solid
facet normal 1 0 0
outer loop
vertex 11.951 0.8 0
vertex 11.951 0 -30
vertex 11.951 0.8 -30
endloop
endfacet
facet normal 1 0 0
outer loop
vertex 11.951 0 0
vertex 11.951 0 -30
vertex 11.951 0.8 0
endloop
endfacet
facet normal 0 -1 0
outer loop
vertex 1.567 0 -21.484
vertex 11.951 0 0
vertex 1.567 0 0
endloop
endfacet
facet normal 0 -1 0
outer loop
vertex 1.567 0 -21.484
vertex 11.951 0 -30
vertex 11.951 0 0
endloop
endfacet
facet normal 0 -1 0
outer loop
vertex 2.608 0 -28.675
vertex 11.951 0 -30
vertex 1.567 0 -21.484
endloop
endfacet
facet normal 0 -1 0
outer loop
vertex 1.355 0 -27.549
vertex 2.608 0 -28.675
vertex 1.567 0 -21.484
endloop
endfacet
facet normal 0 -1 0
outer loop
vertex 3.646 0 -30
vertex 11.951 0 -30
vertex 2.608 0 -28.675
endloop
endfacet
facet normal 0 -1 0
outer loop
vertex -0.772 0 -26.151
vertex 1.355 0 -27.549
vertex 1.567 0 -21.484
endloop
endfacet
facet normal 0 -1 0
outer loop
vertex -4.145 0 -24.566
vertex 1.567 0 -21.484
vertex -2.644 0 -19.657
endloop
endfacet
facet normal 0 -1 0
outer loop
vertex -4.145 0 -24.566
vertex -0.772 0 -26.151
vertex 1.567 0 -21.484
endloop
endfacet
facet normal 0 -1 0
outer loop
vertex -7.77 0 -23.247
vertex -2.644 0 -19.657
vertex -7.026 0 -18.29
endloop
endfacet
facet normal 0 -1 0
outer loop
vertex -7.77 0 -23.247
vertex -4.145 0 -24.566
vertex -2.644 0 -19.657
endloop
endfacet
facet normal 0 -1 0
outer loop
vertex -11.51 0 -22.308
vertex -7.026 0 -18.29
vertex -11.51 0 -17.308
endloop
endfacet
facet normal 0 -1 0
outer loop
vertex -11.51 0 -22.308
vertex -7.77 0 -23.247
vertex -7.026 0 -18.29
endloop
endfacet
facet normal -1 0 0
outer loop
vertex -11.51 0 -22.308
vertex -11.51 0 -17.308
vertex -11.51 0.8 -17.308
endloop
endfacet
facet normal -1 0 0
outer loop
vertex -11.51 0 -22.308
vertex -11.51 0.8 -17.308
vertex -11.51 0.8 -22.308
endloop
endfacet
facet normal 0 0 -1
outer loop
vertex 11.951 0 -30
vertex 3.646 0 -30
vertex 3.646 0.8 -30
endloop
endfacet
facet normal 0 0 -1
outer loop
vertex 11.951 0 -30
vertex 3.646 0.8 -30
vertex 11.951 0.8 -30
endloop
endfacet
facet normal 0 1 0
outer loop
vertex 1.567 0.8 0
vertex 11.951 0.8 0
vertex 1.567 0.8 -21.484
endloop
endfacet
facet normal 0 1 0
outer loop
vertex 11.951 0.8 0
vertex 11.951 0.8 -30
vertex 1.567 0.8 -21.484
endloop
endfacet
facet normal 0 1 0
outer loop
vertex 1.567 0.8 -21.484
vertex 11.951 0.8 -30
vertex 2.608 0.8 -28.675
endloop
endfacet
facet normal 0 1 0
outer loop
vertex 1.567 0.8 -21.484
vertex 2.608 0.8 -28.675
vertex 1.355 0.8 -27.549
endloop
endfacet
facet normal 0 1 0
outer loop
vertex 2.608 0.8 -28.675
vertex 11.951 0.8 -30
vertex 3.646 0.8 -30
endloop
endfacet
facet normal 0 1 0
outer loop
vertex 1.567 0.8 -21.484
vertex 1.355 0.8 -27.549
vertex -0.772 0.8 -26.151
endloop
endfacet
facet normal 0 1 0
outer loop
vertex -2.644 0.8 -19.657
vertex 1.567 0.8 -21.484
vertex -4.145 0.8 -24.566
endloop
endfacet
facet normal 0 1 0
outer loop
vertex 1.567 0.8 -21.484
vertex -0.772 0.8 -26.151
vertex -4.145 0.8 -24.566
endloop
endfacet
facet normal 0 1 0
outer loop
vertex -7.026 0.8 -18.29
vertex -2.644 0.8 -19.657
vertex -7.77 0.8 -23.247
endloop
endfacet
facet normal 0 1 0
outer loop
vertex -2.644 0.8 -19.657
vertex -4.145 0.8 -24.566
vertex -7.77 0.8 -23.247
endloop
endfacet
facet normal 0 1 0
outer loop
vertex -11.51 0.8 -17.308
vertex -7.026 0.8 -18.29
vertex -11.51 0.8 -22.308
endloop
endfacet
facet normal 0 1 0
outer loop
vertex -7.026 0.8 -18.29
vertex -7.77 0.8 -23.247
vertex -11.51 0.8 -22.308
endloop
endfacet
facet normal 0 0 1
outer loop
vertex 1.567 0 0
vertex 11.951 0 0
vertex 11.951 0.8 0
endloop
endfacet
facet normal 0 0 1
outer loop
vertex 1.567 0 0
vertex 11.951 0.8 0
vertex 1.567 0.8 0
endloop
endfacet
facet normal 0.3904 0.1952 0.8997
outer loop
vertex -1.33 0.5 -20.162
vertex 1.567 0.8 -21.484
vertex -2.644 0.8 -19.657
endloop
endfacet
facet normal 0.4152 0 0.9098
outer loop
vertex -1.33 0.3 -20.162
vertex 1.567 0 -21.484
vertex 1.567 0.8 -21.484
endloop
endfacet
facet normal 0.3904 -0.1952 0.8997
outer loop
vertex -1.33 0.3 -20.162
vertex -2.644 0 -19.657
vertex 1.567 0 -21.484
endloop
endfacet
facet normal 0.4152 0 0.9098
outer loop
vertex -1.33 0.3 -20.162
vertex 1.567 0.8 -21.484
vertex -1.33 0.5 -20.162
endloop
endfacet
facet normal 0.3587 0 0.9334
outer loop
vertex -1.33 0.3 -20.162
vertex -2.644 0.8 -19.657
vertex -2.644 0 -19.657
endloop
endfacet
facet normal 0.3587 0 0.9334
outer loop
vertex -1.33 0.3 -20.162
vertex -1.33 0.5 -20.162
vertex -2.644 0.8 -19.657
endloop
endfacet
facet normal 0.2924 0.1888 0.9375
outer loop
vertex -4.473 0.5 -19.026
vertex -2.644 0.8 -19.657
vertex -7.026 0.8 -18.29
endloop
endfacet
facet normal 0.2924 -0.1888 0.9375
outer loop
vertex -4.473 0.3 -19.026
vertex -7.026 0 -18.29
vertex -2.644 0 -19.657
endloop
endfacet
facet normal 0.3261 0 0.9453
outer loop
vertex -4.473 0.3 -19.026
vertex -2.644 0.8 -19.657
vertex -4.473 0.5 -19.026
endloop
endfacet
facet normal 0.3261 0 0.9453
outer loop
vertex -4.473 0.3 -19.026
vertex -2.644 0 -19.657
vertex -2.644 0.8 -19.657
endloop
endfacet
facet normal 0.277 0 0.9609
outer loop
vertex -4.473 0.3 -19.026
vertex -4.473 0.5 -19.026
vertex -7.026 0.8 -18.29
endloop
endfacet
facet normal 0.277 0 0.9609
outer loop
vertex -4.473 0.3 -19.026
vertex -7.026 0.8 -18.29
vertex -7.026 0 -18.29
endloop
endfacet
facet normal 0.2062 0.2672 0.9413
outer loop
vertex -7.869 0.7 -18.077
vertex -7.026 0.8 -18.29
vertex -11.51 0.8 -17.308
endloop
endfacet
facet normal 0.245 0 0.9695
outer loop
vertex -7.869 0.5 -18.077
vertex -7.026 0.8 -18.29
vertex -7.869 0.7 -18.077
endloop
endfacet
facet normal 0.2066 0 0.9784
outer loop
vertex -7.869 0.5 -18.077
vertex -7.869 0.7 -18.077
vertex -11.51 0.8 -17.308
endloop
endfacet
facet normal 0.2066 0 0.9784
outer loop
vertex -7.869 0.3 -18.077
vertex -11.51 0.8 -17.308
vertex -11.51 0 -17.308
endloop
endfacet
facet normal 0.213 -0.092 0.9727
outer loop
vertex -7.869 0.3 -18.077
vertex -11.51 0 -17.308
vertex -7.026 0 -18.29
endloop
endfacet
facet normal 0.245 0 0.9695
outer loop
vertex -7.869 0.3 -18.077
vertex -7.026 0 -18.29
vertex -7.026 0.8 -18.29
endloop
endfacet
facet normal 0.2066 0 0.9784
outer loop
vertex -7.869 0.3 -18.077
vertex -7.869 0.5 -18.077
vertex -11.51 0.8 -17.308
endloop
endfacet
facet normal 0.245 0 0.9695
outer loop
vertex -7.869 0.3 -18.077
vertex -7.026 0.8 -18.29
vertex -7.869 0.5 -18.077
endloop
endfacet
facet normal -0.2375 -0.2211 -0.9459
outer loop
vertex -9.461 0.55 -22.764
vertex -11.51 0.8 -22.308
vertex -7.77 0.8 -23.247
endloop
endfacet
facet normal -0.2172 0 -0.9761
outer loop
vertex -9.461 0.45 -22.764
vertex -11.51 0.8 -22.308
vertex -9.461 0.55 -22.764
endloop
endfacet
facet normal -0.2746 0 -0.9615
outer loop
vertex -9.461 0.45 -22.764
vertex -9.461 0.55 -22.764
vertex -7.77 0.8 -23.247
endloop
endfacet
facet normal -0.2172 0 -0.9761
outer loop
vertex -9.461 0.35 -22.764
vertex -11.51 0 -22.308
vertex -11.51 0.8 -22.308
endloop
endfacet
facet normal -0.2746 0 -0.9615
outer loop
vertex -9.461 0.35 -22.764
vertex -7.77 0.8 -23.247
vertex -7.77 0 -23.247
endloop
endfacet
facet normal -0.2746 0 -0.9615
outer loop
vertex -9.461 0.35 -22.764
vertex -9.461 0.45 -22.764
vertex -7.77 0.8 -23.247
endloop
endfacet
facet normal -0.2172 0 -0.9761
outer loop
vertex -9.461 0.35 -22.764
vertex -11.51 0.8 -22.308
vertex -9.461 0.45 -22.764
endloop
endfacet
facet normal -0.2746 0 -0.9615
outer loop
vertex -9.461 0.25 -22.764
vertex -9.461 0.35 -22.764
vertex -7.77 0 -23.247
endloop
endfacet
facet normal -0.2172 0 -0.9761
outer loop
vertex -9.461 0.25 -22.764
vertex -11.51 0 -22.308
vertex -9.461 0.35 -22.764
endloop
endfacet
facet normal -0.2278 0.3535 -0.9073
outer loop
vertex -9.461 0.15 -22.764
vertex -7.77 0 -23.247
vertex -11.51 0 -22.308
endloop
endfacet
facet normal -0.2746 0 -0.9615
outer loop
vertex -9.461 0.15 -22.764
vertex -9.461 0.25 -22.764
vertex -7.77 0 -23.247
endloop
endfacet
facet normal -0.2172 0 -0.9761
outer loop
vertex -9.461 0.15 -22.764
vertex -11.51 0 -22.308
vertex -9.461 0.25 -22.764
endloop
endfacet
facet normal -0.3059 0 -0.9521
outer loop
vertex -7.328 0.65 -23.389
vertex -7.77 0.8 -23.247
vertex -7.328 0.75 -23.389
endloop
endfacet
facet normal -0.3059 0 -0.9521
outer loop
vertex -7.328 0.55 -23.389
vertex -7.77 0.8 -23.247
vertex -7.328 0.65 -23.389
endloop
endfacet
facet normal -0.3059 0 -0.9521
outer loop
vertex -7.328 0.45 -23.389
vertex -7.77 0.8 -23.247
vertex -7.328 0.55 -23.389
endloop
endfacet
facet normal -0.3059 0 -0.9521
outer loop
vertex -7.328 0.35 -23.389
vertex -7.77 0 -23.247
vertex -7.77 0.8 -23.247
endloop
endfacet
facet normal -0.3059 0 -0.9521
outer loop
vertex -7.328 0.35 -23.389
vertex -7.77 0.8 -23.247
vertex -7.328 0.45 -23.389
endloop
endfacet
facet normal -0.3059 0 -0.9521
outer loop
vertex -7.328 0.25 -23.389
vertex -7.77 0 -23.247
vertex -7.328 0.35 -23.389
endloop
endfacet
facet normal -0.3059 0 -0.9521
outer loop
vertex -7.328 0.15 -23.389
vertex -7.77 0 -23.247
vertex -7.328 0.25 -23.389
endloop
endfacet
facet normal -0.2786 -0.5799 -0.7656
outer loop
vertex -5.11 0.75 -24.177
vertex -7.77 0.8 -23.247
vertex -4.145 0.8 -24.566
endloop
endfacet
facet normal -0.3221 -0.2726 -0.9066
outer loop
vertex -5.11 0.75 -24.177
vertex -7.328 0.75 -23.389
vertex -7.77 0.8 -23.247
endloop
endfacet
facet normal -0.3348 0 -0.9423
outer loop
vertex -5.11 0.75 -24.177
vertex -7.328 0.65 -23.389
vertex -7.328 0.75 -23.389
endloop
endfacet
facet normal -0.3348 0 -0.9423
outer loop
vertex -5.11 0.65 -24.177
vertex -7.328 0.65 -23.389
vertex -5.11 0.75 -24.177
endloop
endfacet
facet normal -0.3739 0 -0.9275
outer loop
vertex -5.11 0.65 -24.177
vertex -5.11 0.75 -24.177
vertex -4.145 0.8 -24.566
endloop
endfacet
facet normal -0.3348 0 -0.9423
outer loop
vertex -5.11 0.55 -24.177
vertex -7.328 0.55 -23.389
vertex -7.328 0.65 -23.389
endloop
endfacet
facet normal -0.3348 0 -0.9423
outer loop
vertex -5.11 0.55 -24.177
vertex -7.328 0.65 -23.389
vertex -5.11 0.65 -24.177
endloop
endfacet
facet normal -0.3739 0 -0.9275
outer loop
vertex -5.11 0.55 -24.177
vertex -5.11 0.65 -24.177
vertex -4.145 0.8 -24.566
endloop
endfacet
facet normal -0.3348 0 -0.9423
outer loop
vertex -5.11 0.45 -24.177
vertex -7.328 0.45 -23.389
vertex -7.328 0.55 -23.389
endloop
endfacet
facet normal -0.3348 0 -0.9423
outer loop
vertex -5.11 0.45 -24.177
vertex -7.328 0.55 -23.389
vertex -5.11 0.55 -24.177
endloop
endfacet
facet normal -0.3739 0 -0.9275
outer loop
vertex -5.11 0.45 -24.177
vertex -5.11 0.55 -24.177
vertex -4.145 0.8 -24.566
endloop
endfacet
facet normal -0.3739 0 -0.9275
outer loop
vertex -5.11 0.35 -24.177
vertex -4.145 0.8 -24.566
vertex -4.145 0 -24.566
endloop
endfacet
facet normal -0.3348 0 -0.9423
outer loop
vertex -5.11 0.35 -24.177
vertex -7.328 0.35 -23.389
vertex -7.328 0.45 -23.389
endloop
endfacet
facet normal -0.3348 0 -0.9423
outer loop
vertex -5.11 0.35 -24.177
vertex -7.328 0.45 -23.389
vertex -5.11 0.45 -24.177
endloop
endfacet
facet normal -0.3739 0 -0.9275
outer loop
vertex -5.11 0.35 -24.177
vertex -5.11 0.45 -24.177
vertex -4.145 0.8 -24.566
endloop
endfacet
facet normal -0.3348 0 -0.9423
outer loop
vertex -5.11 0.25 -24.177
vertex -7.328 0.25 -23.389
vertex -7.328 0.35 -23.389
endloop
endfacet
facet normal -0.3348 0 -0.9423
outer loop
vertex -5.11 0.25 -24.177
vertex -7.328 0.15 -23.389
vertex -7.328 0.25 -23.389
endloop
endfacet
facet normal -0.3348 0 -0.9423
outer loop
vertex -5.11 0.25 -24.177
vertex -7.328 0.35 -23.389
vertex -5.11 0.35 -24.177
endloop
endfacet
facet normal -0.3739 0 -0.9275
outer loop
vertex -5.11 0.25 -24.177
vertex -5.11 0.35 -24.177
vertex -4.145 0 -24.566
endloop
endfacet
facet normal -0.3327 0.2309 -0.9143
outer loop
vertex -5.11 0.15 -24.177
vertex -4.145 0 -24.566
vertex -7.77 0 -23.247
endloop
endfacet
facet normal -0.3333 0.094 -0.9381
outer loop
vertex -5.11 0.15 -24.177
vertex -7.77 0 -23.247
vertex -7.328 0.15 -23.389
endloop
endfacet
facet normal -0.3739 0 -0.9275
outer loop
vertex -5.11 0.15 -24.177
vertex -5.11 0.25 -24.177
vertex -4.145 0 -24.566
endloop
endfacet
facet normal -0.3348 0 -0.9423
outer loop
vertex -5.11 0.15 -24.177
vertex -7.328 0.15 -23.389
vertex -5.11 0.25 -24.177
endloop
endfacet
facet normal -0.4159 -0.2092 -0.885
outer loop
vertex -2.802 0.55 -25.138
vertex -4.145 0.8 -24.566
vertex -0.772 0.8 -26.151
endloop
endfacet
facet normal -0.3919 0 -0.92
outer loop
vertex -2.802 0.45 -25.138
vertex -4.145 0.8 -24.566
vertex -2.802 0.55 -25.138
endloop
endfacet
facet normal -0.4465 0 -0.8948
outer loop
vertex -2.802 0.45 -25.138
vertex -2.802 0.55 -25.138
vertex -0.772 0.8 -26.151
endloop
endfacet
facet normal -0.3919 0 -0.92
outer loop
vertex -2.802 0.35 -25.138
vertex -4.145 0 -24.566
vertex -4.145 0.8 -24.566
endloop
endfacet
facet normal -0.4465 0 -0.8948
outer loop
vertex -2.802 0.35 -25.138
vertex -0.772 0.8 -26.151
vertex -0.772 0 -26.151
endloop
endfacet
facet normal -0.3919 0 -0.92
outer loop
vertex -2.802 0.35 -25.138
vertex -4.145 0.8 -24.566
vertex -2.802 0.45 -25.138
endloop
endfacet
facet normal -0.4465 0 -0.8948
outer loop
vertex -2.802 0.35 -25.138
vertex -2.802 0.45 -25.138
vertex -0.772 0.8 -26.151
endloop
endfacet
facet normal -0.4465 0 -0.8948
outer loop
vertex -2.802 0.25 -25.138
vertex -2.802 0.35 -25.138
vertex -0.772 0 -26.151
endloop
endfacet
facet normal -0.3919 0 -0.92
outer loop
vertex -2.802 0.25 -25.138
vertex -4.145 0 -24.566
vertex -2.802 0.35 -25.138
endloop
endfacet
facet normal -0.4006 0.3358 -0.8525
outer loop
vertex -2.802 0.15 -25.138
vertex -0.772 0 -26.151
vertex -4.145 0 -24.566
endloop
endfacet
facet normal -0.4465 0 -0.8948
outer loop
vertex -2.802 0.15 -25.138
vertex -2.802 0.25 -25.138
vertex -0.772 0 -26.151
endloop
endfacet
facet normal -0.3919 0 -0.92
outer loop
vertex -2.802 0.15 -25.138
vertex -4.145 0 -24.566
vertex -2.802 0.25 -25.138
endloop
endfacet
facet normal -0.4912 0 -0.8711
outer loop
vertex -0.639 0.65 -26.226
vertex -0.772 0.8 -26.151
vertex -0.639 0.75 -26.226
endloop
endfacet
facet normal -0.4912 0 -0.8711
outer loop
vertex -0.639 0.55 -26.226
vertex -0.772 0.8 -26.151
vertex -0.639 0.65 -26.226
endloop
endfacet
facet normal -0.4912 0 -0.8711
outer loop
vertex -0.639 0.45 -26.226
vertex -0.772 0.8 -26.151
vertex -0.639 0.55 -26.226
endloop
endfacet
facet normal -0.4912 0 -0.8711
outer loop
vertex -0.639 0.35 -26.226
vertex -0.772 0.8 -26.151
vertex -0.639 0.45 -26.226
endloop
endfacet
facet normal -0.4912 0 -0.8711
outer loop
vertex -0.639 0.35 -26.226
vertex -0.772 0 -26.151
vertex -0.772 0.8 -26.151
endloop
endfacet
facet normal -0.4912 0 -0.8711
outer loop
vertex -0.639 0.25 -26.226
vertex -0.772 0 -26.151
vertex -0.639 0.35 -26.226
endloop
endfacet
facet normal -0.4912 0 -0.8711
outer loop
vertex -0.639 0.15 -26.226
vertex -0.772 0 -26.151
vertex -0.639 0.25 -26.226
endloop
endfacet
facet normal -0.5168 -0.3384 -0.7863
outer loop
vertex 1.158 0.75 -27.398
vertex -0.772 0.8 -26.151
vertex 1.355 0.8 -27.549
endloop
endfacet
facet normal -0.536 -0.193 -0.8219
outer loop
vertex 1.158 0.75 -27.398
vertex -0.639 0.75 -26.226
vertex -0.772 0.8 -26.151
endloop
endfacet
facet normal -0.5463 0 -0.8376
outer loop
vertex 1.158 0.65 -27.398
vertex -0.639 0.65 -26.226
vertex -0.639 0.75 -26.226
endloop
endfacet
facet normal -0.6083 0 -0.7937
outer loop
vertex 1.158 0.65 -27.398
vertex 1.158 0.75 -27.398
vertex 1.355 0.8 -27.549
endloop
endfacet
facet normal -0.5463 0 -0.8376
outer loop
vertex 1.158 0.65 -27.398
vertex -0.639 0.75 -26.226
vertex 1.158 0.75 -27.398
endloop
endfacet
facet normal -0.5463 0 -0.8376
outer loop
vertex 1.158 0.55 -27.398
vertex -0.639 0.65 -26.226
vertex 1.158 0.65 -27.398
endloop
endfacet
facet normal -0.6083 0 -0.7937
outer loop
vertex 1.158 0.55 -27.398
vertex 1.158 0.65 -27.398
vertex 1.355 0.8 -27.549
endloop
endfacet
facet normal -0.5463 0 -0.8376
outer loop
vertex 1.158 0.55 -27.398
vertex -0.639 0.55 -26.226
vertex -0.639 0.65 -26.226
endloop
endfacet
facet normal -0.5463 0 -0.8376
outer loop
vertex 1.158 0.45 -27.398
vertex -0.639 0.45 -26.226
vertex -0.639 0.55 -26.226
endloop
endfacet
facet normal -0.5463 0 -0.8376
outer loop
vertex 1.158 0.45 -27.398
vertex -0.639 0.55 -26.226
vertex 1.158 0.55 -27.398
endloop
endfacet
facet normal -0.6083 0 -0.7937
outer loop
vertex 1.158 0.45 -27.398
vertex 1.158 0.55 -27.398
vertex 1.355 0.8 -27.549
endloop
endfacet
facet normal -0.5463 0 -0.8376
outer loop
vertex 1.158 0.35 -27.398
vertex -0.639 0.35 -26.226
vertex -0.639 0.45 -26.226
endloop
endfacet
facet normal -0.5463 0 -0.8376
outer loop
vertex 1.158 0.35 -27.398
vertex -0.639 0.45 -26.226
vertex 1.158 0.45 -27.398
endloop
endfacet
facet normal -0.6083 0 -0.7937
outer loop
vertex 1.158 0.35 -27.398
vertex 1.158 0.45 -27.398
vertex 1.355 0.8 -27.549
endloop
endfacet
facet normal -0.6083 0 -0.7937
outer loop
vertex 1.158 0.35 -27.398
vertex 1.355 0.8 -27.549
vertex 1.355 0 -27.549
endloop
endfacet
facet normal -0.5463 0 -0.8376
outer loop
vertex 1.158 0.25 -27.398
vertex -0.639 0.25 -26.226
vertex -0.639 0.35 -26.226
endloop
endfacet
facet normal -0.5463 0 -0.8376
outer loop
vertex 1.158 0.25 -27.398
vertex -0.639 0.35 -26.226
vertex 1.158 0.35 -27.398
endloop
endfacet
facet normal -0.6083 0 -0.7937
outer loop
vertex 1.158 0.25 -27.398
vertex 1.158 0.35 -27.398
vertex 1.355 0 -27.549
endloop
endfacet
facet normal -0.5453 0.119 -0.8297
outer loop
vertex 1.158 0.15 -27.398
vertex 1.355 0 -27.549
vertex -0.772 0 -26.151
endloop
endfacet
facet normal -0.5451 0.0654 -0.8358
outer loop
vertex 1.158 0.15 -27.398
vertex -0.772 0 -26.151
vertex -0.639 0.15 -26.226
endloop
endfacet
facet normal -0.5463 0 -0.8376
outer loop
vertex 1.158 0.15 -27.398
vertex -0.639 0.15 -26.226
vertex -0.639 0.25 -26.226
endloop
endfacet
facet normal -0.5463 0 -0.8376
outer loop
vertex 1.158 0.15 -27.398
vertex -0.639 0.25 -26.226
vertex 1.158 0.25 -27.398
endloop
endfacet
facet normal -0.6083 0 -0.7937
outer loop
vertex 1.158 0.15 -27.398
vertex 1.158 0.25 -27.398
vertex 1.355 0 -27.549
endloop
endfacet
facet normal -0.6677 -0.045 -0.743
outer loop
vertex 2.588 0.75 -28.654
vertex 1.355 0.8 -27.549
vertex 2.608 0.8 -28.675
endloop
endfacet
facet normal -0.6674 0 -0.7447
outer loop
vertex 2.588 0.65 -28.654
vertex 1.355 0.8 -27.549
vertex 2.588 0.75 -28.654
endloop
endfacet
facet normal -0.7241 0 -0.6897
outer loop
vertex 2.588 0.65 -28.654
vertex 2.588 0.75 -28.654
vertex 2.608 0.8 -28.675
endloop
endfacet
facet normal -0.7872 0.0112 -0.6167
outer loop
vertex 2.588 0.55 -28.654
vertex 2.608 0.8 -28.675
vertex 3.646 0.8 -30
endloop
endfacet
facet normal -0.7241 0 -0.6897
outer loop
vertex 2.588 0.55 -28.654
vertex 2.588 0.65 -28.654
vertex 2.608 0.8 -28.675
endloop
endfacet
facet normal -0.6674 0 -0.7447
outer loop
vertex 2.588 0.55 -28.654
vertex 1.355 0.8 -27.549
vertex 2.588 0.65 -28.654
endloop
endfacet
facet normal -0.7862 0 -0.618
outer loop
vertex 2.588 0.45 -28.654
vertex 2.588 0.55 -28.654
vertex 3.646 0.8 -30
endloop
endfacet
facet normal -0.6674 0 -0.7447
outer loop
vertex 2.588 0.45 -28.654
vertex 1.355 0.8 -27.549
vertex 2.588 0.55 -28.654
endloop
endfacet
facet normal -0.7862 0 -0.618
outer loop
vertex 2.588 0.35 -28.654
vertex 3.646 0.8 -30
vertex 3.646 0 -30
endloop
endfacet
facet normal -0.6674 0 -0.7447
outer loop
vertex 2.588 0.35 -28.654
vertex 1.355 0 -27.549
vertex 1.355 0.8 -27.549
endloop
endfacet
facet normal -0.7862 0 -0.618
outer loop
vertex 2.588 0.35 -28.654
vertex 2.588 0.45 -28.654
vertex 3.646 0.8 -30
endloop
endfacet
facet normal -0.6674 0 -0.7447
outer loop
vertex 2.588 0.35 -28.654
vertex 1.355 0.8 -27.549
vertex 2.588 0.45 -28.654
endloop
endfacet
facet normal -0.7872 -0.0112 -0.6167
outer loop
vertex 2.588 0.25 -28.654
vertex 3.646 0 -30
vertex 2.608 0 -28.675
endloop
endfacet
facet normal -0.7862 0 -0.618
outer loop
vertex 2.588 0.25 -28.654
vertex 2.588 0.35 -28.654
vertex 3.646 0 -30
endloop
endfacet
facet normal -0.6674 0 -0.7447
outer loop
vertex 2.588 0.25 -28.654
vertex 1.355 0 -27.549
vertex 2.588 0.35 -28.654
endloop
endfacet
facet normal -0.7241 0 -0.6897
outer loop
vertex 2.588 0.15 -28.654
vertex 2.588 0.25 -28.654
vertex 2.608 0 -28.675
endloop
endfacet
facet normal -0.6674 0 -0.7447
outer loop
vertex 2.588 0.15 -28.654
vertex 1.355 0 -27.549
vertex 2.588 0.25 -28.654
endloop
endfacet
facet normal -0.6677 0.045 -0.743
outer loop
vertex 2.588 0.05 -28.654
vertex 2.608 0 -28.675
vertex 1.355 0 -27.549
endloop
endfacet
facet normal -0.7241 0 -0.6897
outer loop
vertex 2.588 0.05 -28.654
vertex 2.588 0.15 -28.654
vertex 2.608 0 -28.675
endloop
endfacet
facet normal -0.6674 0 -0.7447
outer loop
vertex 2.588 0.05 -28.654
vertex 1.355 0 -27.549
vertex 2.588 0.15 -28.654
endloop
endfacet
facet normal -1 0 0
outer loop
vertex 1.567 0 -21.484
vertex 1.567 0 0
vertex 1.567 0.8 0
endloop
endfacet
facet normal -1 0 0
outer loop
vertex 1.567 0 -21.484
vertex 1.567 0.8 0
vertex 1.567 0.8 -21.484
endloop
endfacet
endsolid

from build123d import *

# Parameters (mm, degrees)
SALIENTE_EXTRUIR1_DEPTH = 0.8


with BuildPart() as part:
    # Croquis1 → Saliente-Extruir1 (new body)
    with BuildSketch(Plane(origin=(0, 0, 0), x_dir=(1, 0, 0), z_dir=(0, 1, 0))):
        with BuildLine():
            Line((11.951198341, 0), (1.566582957, 0))
            Line((1.566582957, 0), (1.566582957, 21.484375))
            add(Edge.make_bspline(
                [(1.566582957, 21.484375), (1.095820528, 21.251760804), (0.143924465, 20.781407768), (-1.339162826, 20.146101999), (-2.883063991, 19.561156582), (-4.486453246, 19.009201316), (-6.153702842, 18.514537388), (-7.88399318, 18.064343747), (-9.672785077, 17.652551437), (-10.892485897, 17.42364675), (-11.51034012, 17.307692308)],
                knots=[0, 0, 0, 0, 0.914662506, 1.849475632, 2.80936432, 3.790486333, 4.802984391, 5.838208378, 6.90491827, 8, 8, 8, 8], degree=3))
            Line((-11.51034012, 17.307692308), (-11.51034012, 22.307692308))
            add(Edge.make_bspline(
                [(-11.51034012, 22.307692308), (-11.171106186, 22.372634387), (-10.483453335, 22.504276895), (-9.451668755, 22.763592481), (-8.39369247, 23.049455415), (-7.317476662, 23.388764811), (-6.216247699, 23.760045556), (-5.09514427, 24.174939392), (-3.956405837, 24.642192089), (-2.804458982, 25.127837698), (-1.691104507, 25.65221946), (-0.654736292, 26.206690566), (0.295578873, 26.774589611), (1.147842659, 27.377323684), (1.915075329, 27.993311535), (2.586248834, 28.63448494), (3.172747888, 29.2922732), (3.490689658, 29.767831075), (3.64590988, 30)],
                knots=[0, 0, 0, 0, 0.954535859, 1.934916405, 2.939715041, 3.983531249, 5.053414062, 6.151915828, 7.287094686, 8.455495175, 9.607244907, 10.687324305, 11.703425869, 12.665113946, 13.570542581, 14.420407214, 15.228837587, 16, 16, 16, 16], degree=3))
            Line((3.64590988, 30), (11.951198341, 30))
            Line((11.951198341, 30), (11.951198341, 0))
        make_face()
    extrude(amount=SALIENTE_EXTRUIR1_DEPTH)


solid = part.part
